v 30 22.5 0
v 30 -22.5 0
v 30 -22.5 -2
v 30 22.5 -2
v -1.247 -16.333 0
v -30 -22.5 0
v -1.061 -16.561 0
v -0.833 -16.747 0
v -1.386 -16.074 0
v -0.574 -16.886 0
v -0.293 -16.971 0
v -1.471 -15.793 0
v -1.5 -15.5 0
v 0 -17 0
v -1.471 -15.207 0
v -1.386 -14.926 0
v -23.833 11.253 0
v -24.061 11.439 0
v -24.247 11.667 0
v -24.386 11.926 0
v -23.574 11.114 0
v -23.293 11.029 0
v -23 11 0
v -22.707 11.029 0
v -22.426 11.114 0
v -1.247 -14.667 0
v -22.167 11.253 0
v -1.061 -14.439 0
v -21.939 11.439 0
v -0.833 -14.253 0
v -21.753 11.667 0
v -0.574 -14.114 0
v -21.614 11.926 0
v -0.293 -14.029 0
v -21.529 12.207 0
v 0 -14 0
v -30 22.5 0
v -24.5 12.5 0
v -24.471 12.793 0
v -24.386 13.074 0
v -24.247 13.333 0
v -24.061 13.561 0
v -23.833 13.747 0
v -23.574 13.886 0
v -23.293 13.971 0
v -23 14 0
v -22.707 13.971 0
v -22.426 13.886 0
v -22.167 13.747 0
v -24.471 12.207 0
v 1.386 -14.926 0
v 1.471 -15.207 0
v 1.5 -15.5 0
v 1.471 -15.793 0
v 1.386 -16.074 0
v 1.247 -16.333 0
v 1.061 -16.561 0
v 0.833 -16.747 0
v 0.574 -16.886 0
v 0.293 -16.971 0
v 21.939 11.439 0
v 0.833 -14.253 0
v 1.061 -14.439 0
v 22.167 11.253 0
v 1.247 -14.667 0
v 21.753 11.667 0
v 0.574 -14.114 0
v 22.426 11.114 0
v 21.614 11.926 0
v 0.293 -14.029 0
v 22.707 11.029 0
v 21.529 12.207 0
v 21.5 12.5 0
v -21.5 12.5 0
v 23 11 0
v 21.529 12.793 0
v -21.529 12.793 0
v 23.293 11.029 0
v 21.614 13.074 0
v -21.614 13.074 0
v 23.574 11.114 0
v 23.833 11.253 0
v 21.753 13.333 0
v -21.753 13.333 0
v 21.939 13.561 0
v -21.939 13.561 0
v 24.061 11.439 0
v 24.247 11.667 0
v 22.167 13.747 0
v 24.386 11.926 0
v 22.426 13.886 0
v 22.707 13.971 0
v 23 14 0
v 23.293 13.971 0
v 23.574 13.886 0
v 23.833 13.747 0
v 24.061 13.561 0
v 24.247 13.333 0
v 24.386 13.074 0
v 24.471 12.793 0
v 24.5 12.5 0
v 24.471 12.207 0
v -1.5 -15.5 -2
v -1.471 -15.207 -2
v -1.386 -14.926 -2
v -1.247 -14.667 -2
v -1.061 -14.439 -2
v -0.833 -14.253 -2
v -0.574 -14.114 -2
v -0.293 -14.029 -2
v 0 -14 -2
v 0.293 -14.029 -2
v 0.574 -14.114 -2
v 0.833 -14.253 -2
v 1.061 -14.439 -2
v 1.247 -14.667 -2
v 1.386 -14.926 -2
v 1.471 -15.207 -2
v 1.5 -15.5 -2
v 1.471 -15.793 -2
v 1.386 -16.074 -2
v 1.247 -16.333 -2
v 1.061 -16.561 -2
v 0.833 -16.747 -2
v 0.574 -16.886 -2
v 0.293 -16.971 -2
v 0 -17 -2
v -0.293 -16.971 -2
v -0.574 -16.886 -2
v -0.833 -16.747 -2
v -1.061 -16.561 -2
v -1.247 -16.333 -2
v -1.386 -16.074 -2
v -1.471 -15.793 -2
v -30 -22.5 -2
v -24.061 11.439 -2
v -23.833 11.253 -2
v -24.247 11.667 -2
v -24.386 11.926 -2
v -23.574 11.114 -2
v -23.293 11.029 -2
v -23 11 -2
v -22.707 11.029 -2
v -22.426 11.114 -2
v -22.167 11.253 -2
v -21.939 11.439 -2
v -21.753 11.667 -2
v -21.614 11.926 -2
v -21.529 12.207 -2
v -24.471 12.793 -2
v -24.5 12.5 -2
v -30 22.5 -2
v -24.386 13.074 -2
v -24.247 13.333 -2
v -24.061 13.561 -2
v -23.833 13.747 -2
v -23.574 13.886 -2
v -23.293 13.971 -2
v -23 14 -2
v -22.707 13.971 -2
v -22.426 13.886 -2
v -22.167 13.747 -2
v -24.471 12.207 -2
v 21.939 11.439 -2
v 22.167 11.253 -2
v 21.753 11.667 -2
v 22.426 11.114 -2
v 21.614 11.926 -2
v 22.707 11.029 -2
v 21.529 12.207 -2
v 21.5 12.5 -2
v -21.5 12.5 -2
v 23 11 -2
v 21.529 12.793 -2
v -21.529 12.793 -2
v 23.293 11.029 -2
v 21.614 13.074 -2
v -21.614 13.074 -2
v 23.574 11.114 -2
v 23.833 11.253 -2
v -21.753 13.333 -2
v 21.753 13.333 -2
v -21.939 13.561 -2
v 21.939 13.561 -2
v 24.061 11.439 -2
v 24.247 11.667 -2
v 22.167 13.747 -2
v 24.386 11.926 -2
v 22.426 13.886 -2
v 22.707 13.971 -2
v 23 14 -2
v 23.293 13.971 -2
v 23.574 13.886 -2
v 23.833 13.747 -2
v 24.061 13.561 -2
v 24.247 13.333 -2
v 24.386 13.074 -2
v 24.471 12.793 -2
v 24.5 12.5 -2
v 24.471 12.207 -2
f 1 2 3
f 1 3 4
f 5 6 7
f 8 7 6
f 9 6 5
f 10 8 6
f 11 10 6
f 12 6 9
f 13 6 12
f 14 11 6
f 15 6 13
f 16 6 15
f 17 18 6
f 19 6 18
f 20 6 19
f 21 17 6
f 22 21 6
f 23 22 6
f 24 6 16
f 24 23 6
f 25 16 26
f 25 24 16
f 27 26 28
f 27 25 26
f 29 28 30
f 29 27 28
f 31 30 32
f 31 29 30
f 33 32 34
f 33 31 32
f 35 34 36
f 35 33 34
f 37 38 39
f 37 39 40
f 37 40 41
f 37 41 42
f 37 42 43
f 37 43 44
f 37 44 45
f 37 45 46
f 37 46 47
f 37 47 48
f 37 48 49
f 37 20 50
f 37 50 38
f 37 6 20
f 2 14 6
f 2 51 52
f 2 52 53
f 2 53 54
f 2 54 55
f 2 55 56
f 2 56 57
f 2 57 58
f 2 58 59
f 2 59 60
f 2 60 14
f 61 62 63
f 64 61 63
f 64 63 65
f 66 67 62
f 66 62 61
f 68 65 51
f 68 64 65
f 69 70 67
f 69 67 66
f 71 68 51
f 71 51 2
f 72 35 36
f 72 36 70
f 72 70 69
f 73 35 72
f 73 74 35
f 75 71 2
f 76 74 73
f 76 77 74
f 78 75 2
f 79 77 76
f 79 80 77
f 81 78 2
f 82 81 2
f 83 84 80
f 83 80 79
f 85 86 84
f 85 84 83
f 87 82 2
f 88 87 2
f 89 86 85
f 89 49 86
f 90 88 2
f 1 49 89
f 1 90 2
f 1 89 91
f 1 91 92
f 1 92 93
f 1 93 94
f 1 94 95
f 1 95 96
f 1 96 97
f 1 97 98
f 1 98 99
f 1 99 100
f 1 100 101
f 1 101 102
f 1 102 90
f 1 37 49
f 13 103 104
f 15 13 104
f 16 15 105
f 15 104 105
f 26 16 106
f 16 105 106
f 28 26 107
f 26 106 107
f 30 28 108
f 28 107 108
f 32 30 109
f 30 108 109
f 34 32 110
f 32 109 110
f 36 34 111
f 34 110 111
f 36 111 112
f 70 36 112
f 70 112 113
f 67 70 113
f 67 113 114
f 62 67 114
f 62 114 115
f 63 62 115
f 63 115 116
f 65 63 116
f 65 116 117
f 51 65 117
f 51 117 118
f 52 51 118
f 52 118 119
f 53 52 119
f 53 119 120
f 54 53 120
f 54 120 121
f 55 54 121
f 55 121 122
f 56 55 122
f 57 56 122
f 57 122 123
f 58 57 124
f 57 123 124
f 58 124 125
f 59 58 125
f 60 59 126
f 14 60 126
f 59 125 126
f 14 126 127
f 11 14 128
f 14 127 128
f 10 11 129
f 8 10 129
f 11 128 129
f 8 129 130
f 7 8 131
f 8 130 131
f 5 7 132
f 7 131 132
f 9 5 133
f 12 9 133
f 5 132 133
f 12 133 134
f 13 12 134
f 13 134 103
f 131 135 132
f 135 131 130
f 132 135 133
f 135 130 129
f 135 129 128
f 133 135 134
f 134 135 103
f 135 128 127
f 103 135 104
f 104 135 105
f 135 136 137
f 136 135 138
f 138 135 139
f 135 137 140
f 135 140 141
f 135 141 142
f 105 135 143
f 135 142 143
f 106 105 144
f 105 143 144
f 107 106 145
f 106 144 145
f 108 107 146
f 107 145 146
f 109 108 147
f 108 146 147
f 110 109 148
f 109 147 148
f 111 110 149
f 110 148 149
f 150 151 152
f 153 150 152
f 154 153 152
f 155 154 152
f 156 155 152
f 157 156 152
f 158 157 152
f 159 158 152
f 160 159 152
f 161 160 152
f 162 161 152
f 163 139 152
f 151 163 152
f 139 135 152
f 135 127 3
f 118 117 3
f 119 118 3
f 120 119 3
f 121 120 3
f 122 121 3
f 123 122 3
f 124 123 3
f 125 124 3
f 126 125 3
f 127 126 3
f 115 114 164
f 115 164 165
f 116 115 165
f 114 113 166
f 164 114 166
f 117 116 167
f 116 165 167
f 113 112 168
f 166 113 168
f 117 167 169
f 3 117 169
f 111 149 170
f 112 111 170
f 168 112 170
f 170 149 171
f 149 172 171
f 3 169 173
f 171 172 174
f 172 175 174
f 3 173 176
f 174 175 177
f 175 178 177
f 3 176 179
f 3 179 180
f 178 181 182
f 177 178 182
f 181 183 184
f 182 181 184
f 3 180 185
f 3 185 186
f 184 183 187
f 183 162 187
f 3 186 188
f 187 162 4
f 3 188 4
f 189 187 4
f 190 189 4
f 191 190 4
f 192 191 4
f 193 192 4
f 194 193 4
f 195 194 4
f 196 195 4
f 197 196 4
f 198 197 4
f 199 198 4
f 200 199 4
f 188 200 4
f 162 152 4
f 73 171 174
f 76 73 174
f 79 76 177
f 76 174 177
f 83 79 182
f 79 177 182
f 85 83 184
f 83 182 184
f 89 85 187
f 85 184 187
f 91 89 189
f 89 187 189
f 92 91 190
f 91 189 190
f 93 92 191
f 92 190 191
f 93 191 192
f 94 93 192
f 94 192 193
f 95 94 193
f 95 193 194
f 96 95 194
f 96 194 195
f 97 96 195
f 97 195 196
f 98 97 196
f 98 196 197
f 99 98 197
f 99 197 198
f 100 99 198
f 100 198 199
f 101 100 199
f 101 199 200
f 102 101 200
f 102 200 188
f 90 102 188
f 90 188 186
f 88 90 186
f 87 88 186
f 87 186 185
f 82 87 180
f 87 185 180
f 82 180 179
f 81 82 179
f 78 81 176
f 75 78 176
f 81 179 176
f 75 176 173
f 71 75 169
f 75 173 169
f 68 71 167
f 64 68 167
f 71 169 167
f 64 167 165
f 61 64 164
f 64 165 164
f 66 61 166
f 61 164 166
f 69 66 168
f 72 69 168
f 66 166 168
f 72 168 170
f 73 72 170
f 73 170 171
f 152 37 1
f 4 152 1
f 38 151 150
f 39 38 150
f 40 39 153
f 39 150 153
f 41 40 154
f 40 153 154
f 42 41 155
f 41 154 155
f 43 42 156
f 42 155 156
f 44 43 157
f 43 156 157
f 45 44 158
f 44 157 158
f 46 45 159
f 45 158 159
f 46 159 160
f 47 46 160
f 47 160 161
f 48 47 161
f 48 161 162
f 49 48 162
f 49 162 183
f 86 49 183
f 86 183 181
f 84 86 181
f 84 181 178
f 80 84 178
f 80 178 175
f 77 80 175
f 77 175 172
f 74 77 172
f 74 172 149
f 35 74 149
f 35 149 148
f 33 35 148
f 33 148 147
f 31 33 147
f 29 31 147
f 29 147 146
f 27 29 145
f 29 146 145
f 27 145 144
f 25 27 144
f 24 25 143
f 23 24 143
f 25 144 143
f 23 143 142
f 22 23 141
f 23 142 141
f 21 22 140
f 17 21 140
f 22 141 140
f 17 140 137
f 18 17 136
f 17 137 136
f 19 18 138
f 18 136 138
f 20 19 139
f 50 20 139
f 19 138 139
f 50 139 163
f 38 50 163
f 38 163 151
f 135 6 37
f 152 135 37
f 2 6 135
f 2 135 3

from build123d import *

# Parameters (mm, degrees)
F0_W     = 60
F0_H     = 45
F1_DEPTH = 2
F3_D     = 3


with BuildPart() as f1:
    # F0 (on Top) → F1 (new body)
    with BuildSketch(Plane.XY):
        Rectangle(F0_W, F0_H)
    extrude(amount=-F1_DEPTH)

    # F3 (through all)
    with Locations(Plane.XY):
        with Locations((-23, 12.5), (23, 12.5), (0, -15.5)):
            Hole(F3_D / 2)


solid = f1.part
